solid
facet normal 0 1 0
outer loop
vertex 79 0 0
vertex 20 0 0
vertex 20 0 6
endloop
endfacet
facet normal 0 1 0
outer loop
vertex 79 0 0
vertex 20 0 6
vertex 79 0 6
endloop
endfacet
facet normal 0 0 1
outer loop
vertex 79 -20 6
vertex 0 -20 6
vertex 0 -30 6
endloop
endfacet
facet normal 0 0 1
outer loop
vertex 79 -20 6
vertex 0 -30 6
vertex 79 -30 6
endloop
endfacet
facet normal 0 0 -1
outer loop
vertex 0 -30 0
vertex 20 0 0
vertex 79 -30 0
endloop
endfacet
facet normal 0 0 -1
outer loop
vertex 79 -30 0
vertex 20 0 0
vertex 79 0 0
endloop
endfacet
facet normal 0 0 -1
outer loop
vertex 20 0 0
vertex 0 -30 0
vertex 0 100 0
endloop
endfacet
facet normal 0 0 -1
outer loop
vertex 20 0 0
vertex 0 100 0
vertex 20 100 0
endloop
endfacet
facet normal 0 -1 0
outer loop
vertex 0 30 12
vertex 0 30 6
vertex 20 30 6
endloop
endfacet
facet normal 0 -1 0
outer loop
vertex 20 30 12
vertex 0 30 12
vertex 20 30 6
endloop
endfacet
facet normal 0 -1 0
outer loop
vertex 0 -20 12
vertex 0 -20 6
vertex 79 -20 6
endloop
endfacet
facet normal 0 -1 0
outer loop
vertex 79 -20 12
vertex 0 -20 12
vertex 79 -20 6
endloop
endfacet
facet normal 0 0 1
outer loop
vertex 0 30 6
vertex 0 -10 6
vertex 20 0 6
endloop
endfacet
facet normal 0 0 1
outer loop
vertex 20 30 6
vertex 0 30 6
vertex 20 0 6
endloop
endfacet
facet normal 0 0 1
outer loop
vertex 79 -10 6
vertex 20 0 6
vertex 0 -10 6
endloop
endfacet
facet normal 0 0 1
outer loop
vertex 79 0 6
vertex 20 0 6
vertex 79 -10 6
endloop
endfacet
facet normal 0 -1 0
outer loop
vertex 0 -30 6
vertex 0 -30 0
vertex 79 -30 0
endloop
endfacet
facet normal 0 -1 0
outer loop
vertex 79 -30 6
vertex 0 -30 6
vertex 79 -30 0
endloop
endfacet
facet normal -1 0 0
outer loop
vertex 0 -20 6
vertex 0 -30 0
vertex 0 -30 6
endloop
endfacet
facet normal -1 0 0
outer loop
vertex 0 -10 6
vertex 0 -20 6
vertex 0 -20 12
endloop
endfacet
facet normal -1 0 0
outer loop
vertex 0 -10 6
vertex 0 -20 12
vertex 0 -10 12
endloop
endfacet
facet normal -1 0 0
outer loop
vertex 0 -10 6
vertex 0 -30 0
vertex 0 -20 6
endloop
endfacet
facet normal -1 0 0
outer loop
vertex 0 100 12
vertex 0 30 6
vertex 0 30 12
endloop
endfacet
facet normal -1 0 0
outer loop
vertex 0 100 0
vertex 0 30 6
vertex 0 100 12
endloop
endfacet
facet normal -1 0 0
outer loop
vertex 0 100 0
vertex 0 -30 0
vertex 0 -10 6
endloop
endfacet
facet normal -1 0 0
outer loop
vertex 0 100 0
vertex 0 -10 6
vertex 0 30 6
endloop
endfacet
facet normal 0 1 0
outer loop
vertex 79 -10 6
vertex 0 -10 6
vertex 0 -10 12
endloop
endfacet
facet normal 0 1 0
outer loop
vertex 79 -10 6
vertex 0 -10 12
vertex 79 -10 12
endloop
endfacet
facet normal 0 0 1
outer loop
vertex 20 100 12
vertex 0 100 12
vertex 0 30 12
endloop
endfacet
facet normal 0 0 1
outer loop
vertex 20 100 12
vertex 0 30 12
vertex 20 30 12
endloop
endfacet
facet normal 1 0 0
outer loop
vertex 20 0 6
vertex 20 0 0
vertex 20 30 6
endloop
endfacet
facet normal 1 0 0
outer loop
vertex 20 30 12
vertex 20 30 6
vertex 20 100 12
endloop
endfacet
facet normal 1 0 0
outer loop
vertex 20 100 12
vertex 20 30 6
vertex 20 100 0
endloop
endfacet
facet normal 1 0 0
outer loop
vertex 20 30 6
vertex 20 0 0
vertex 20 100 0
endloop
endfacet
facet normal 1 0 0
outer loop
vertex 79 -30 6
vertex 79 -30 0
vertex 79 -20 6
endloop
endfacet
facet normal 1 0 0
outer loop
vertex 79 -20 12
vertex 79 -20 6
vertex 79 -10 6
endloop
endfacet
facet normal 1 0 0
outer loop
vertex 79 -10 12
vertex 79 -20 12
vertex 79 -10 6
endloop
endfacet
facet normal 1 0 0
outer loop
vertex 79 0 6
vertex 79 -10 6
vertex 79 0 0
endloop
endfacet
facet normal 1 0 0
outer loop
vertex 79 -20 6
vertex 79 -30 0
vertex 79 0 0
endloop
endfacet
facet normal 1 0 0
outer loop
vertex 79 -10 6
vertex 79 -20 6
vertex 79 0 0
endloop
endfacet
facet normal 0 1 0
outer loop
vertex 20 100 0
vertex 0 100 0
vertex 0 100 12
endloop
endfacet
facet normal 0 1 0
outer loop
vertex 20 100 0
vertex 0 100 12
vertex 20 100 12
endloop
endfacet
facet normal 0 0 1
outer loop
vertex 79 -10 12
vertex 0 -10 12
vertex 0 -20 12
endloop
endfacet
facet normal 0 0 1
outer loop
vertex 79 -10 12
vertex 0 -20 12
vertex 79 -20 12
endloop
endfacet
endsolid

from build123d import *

# Parameters (mm, degrees)
SKETCH1_W           = 20
SKETCH1_H           = 100
BOSS_EXTRUDE4_DEPTH = 6
BOSS_EXTRUDE5_DEPTH = 6
SKETCH3_W           = 79
SKETCH3_H           = 10
BOSS_EXTRUDE6_DEPTH = 6
SKETCH6_W           = 20
SKETCH6_H           = 70
BOSS_EXTRUDE8_DEPTH = 6


with BuildPart() as part:
    # Sketch1 → Boss-Extrude4 (new body)
    with BuildSketch(Plane.XY):
        with Locations((10, 50)):
            Rectangle(SKETCH1_W, SKETCH1_H)
    extrude(amount=BOSS_EXTRUDE4_DEPTH)

    # Sketch1<8> → Boss-Extrude5 (add)
    with BuildSketch(Plane.XY):
        Polygon((20, 0), (0, 0), (0, -30), (79, -30), (79, 0), align=None)
    extrude(amount=BOSS_EXTRUDE5_DEPTH)

    # Sketch3 → Boss-Extrude6 (add)
    with BuildSketch(Plane.XY.offset(6)):
        with Locations((39.5, -15)):
            Rectangle(SKETCH3_W, SKETCH3_H)
    extrude(amount=BOSS_EXTRUDE6_DEPTH)

    # Sketch6 → Boss-Extrude8 (add)
    with BuildSketch(Plane.XY.offset(6)):
        with Locations((10, 65)):
            Rectangle(SKETCH6_W, SKETCH6_H)
    extrude(amount=BOSS_EXTRUDE8_DEPTH)


solid = part.part
